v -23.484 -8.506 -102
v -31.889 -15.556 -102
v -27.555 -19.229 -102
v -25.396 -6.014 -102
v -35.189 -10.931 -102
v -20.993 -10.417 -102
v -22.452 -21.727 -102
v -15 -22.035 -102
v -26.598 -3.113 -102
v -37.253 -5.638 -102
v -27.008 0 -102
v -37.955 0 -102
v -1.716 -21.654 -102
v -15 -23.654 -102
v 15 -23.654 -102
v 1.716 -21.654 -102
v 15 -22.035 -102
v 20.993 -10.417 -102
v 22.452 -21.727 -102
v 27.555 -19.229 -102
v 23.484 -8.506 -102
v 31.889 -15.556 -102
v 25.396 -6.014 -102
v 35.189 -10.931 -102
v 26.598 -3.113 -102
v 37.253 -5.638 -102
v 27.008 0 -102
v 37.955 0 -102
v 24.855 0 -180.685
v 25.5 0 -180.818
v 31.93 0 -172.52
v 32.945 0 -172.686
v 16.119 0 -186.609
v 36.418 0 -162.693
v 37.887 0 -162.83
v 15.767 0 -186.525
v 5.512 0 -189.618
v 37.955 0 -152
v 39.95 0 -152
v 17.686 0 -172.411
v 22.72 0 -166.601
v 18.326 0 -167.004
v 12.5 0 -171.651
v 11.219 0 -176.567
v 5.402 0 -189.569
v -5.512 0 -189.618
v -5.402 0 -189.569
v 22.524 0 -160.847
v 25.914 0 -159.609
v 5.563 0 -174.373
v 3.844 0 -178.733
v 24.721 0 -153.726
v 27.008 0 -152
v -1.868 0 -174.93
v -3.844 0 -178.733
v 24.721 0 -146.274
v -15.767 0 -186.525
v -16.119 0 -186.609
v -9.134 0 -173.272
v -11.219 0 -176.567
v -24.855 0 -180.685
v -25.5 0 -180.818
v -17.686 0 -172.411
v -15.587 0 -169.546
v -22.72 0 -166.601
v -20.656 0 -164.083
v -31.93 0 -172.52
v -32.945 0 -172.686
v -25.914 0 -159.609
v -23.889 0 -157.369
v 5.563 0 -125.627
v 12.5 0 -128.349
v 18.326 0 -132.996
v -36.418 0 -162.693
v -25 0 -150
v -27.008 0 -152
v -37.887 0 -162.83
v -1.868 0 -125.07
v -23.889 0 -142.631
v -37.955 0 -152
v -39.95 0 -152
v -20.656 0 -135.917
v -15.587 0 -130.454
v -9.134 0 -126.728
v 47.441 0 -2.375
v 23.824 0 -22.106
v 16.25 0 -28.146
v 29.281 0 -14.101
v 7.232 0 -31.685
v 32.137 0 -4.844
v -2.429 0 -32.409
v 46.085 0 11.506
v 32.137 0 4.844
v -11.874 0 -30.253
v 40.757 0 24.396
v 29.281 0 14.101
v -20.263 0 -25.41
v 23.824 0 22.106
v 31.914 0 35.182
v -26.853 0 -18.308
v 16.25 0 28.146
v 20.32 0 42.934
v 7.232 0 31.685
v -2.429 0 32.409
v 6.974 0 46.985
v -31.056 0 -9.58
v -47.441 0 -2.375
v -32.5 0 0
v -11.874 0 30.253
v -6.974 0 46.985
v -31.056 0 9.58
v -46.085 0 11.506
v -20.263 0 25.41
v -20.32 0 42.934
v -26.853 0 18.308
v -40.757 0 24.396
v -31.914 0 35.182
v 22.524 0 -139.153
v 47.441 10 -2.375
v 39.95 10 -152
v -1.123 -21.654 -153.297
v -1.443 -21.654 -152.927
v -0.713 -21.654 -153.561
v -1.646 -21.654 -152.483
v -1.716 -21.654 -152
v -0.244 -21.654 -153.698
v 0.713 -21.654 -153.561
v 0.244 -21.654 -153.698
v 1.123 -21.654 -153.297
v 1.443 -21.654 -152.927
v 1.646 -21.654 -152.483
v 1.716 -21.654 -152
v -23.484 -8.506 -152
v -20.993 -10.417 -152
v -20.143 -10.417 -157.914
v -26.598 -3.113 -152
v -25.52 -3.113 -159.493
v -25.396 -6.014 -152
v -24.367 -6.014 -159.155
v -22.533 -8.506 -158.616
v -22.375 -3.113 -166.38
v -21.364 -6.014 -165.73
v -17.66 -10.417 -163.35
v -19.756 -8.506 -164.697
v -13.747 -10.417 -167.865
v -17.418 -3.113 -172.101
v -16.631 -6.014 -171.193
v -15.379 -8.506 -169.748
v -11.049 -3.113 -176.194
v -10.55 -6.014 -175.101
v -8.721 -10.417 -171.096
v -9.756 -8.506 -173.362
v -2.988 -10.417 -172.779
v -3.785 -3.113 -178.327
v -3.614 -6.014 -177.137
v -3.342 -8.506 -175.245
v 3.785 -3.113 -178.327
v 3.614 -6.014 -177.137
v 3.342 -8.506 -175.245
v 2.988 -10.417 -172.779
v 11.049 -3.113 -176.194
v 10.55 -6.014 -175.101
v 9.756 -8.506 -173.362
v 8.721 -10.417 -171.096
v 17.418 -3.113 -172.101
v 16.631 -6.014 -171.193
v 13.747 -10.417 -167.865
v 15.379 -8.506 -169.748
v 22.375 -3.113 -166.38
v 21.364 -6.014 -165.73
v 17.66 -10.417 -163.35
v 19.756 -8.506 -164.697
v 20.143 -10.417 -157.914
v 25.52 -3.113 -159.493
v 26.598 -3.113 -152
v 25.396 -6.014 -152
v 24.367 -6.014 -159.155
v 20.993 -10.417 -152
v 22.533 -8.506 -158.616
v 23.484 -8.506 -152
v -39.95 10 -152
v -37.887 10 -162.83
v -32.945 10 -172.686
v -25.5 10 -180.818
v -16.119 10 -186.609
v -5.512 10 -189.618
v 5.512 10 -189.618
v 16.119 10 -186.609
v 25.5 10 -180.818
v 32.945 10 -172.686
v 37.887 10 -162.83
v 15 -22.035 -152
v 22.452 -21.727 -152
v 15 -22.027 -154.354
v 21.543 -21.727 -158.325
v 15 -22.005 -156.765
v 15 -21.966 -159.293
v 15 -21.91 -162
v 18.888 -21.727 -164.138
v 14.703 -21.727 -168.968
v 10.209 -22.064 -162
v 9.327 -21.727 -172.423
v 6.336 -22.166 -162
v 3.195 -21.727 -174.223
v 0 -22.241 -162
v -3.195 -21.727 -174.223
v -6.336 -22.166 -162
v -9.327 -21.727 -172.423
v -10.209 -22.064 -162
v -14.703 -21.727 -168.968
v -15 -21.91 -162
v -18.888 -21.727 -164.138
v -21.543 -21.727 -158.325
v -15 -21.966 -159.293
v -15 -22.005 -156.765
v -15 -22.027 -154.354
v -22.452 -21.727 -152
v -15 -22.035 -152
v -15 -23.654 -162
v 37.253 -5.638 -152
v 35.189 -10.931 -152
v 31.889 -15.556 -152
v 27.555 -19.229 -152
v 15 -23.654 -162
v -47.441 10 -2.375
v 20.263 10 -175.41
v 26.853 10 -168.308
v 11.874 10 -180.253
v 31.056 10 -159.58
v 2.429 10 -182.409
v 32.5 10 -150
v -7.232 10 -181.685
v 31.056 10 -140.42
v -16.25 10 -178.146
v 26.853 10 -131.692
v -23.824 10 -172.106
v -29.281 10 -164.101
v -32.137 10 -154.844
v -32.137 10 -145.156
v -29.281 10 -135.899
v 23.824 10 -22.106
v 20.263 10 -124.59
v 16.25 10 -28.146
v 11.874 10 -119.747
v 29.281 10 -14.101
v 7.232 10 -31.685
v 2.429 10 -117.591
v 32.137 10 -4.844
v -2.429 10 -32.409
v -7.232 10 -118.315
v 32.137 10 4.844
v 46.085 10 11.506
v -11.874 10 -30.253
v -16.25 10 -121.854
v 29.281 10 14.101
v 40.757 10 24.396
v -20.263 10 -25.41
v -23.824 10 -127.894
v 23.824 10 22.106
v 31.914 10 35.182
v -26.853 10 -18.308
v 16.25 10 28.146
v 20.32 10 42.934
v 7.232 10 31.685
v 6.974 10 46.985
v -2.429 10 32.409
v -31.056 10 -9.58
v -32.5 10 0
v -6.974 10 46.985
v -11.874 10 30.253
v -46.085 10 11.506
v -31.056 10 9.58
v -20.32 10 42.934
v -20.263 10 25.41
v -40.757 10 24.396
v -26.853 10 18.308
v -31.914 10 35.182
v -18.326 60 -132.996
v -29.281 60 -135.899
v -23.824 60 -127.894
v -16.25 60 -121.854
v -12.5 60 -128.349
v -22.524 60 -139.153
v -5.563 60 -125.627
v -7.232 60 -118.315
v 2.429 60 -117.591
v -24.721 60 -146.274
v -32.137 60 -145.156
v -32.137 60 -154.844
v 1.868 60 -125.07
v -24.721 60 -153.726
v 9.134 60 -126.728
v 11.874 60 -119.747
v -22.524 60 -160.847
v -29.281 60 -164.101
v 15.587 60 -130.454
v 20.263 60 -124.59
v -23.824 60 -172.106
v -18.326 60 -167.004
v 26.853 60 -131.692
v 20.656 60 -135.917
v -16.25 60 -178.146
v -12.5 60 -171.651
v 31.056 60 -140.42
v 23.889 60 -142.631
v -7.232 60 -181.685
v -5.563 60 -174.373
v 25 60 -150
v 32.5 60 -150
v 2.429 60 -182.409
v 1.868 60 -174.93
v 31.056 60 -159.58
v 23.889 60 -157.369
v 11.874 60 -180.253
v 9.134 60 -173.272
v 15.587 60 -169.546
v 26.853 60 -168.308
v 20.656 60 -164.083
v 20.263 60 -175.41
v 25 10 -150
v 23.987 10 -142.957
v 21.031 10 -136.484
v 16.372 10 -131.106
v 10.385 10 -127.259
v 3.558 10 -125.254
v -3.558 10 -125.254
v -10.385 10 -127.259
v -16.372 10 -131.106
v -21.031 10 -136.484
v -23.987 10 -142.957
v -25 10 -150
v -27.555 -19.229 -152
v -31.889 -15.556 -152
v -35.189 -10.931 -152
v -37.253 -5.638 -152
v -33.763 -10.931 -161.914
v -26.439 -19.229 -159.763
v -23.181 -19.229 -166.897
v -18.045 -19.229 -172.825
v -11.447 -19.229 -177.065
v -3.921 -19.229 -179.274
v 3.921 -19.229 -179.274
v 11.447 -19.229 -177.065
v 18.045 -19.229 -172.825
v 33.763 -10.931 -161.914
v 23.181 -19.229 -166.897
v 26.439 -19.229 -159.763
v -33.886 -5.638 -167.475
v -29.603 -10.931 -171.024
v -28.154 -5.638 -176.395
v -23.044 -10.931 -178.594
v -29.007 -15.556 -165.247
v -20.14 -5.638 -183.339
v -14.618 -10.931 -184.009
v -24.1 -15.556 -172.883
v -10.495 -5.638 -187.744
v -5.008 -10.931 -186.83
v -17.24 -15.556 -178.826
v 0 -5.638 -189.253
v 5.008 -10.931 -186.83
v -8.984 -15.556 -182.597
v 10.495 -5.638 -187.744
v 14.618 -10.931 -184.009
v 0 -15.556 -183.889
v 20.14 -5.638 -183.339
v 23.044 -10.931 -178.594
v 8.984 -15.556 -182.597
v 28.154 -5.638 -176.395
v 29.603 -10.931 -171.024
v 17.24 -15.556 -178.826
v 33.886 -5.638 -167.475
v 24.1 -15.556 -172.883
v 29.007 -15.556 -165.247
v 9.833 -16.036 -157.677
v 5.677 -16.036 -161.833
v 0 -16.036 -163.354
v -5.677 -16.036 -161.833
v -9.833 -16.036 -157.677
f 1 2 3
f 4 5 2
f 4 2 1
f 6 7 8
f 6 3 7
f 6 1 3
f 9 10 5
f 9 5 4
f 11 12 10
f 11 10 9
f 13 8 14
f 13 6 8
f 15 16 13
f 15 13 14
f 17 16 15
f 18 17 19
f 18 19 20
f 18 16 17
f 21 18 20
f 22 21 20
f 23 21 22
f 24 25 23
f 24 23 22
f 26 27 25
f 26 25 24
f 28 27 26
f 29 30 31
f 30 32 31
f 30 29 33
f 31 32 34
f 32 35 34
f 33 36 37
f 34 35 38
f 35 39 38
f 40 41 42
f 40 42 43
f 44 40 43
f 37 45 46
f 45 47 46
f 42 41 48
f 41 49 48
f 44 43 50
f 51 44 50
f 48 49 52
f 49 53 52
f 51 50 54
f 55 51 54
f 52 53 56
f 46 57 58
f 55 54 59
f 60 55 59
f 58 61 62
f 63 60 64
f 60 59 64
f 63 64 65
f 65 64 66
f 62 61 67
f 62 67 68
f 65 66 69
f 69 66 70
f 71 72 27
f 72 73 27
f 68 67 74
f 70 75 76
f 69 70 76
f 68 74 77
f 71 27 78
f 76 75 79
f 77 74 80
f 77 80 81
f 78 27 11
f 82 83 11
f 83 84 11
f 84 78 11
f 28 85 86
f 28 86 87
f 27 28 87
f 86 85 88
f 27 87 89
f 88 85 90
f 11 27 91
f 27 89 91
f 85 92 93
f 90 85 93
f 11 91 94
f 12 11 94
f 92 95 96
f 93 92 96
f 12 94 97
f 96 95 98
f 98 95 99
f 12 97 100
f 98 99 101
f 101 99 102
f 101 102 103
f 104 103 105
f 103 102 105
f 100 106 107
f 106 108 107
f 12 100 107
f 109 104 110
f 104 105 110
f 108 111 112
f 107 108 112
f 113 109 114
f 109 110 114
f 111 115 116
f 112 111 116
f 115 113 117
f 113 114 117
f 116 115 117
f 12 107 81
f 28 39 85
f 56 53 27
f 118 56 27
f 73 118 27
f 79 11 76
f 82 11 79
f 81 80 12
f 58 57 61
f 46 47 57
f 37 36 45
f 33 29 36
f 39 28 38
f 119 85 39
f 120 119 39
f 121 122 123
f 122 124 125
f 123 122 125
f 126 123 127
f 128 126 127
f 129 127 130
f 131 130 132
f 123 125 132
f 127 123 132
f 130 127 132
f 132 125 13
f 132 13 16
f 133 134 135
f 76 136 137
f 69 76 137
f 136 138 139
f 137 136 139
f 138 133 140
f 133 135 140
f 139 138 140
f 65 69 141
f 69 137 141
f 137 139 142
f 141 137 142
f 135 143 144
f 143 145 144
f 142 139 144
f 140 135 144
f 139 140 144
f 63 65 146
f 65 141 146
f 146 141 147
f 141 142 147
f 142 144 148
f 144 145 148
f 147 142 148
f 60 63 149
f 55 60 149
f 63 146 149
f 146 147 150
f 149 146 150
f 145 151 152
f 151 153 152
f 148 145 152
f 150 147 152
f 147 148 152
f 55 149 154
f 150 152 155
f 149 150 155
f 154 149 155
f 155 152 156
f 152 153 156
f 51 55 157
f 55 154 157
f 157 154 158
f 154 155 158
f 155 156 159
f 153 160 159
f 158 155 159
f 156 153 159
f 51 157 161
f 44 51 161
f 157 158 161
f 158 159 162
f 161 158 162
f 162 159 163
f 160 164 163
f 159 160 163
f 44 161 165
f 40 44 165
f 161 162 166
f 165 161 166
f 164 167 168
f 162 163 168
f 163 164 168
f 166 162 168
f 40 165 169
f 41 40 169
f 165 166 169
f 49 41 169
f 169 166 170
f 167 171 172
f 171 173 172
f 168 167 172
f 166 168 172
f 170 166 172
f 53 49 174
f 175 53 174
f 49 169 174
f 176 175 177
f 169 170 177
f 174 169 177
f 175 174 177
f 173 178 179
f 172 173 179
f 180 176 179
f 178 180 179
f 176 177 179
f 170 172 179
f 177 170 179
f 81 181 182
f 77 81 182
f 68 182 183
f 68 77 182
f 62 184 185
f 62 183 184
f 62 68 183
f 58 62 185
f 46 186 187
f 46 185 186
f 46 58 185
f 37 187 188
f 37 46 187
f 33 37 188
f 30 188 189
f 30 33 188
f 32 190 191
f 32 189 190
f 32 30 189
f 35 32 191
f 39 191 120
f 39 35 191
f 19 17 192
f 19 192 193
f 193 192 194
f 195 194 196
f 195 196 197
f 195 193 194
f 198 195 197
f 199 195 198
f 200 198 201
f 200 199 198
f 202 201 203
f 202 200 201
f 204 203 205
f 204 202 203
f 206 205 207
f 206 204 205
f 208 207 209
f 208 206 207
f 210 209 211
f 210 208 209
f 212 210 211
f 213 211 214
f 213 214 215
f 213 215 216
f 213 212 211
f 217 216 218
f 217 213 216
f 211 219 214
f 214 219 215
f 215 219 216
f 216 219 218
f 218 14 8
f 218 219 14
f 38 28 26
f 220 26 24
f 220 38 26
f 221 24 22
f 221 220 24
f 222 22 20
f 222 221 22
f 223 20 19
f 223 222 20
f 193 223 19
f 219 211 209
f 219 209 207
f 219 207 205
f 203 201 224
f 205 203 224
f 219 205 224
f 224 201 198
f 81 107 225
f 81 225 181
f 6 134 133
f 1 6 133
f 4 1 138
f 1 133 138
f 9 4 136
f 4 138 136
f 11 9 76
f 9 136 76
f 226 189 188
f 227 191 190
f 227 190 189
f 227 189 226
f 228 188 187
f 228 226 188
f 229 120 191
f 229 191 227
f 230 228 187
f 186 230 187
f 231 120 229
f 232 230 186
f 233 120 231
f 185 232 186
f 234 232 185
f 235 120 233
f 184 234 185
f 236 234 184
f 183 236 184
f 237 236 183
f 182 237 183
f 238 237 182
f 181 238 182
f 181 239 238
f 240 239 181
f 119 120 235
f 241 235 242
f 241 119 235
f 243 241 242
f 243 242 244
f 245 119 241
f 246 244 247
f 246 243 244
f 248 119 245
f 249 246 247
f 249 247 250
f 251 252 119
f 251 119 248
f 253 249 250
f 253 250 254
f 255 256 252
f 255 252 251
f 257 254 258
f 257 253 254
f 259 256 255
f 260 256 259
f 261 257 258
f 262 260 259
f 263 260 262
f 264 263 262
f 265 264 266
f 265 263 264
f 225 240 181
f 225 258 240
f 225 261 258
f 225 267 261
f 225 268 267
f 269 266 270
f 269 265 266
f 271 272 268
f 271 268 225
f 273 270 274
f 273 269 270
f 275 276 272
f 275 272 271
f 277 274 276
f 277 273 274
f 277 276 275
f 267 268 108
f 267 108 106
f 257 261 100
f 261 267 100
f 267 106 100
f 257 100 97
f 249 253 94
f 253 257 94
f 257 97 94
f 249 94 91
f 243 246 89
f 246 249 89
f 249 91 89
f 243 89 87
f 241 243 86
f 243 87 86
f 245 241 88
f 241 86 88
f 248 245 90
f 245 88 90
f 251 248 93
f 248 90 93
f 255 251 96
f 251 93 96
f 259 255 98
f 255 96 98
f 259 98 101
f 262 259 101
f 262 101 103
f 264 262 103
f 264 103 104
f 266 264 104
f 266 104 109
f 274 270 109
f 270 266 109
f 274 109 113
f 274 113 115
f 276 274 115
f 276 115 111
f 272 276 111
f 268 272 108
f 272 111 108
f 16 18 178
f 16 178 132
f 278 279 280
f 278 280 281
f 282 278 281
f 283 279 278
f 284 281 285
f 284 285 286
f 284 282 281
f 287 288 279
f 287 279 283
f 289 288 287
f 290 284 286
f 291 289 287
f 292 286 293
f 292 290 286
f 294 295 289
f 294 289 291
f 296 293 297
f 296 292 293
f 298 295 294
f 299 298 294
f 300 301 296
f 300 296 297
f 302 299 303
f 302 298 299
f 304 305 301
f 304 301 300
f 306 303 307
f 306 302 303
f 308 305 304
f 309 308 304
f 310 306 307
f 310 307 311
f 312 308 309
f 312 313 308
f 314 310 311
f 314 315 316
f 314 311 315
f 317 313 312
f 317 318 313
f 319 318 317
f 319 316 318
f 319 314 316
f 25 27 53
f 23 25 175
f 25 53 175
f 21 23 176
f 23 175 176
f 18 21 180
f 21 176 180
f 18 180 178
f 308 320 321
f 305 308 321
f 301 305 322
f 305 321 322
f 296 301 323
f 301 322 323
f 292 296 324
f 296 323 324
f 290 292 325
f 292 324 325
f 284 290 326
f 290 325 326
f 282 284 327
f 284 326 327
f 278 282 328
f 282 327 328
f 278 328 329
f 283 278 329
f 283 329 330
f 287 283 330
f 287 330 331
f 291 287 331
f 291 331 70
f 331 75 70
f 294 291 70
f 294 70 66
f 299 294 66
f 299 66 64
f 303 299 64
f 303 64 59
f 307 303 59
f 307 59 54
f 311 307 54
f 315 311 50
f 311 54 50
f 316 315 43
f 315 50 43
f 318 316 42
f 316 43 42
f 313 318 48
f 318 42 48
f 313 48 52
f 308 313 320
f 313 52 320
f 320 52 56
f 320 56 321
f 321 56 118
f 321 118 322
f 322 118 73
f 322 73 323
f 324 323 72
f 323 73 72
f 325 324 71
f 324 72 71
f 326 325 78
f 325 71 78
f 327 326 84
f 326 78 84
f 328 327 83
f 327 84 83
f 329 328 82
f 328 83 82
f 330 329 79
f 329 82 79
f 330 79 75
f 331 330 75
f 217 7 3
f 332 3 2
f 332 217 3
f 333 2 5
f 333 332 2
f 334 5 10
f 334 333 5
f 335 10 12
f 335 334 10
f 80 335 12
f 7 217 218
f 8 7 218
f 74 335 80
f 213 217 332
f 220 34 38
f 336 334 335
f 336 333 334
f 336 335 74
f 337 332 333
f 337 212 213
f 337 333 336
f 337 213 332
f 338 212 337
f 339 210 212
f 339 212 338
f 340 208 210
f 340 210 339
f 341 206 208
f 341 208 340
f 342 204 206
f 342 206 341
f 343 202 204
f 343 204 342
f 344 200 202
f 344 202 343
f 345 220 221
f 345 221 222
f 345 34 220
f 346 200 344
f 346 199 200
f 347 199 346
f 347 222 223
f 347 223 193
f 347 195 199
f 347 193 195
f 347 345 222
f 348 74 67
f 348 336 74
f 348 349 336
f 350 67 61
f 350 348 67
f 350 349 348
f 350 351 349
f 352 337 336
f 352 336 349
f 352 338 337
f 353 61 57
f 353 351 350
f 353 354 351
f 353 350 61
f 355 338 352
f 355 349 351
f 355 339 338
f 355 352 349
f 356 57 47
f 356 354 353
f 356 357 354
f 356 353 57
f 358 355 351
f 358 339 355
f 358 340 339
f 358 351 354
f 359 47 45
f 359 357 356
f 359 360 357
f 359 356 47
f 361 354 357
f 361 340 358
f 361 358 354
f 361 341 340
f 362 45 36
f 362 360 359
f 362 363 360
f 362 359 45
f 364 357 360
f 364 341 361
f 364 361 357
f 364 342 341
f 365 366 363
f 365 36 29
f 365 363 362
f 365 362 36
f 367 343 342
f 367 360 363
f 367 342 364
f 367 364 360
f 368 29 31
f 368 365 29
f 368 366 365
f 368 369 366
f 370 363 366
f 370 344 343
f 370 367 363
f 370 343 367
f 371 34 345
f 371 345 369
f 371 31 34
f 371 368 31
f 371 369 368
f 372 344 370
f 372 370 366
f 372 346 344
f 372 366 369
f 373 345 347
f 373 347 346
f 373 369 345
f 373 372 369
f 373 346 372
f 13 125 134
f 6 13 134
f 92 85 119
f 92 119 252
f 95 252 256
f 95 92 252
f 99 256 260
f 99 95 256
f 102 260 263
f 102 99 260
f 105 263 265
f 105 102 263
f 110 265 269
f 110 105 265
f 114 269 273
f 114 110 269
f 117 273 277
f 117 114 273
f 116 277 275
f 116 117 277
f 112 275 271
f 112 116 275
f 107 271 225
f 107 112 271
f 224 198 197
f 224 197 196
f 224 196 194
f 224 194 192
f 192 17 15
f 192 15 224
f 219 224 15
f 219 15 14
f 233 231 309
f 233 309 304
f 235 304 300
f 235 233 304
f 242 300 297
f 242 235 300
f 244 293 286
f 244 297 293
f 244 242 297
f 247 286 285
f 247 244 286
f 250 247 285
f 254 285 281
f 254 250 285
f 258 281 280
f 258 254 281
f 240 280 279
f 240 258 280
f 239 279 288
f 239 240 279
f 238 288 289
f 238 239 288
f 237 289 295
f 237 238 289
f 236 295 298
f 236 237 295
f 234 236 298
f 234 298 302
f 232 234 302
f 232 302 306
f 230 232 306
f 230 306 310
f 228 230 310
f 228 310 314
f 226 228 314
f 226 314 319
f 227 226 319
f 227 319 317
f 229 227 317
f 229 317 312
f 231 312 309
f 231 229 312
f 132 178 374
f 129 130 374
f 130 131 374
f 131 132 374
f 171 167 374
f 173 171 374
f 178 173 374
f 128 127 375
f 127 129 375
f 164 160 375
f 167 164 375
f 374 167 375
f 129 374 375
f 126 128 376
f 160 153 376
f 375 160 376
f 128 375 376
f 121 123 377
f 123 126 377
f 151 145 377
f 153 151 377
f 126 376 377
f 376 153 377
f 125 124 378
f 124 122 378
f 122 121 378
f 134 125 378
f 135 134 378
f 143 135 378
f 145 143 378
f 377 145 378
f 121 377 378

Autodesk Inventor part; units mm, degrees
ref_plane "YZ Plane" through (0, 0, 0) normal (1, 0, 0) x (0, 1, 0)
ref_plane "XZ Plane" through (0, 0, 0) normal (0, 1, 0) x (-1, 0, 0)
sketch "Skizze1" plane through (0, 0, 0) normal (0, 1, 0) x (-1, 0, 0)
  circle A0 centre (0, 0) radius 32.5
  circle A1 centre (0, 0) radius 47.5
  line L0 (0, 0) -> (0, -150) construction
  circle A2 centre (0, -150) radius 25
  circle A3 centre (0, -150) radius 40
  line L1 (47.4406, -2.375) -> (39.95, -152)
  line L2 (-47.4406, -2.375) -> (-39.95, -152)
  dimension "d0" = 65
  dimension "d1" = 15
  dimension "d2" = 150
  dimension "d3" = 50
  dimension "d4" = 15
extrude "Extrusion1" add sketch "Skizze1" along normal blind 10
sketch "Skizze2" plane through (0, 10, 0) normal (0, 1, 0) x (1, 0, 0)
  circle A0 centre (0, 150) radius 25 projected
  circle A1 centre (0, 150) radius 32.5
  point P0 (0, 0)
  dimension "d7" = 7.5
extrude "Extrusion2" add sketch "Skizze2" along normal blind 50
ref_plane "Arbeitsebene1" through (0, 0, -190) normal (-1, 0, 0) x (0, -1, 0)
sketch "Skizze3" plane through (0, 0, -190) normal (-1, 0, 0) x (0, -1, 0)
  line L0 (0, 38) -> (0, 0) projected
  line L1 (0, 10.9925) -> (10.9925, 10.9925) construction
  line L2 (0, 10.9925) -> (0, 0) construction
  line L3 (0, 0) -> (0, 3)
  line L4 (0, 38) -> (-10, 38) construction
  line L5 (0, 38) -> (16.612, 38) construction
  arc A0 (0, 10.9925) -> (10.4174, 17.007) centre (0, 23.0214) ccw
  line L6 (0, 23.0214) -> (12.0289, 23.0214) construction
  line L7 (0, 23.0214) -> (0, 10.9925) construction
  line L8 (-10.9478, 2.8205) -> (-10.9478, 33.9693) construction
  line L9 (-10.9478, 33.9693) -> (20.2009, 33.9693) construction
  line L10 (22.6543, 38) -> (21.7274, 15.548)
  arc A1 (0, 0.0447) -> (21.7274, 15.548) centre (0, 23.0214) ccw
  line L11 (0, 10.9925) -> (0, 3)
  line L12 (10.4174, 17.007) -> (22.6543, 38)
  point P0 (0, 190)
  dimension "d12" = 90
revolve "Umdrehung1" add sketch "Skizze3" angle 180 mid plane about axis through (0, 0, -152) along (0, -1, 0)
sketch "Skizze4" plane through (-37.9553, 0, -152) normal (0, 0, 1) x (1, 0, 0)
  line L0 (64.9628, 0) -> (75.9106, 0) projected
  arc A0 (58.9484, -10.4174) -> (64.9628, 0) centre (52.9339, 0) ccw projected
  line L1 (58.9484, -10.4174) -> (37.9553, -22.6543) projected
  line L2 (37.9553, -22.6543) -> (60.4073, -21.7274) projected
  arc A1 (60.4073, -21.7274) -> (75.9106, 0) centre (52.9339, 0) ccw projected
  line L3 (0, 0) -> (10.9478, 0) projected
  arc A2 (0, 0) -> (15.5034, -21.7274) centre (22.9768, 0) ccw projected
  line L4 (15.5034, -21.7274) -> (37.9553, -22.6543) projected
  line L5 (37.9553, -22.6543) -> (16.9623, -10.4174) projected
  arc A3 (10.9478, 0) -> (16.9623, -10.4174) centre (22.9768, 0) ccw projected
  point P0 (37.9553, 0)
extrude "Extrusion3" add sketch "Skizze4" along normal blind 50
sketch "Skizze5" plane through (-37.9553, 0, -102) normal (0, 0, 1) x (1, 0, 0)
  line L0 (22.9553, -21.6543) -> (52.9553, -21.6543)
  line L1 (52.9553, -21.6543) -> (52.9553, -23.6543)
  line L2 (52.9553, -23.6543) -> (22.9553, -23.6543)
  line L3 (22.9553, -23.6543) -> (22.9553, -21.6543)
  line L4 (37.9553, -22.6543) -> (16.9623, -10.4174) projected
  line L5 (22.9553, -21.6543) -> (52.9553, -23.6543) construction
  line L6 (52.9553, -21.6543) -> (22.9553, -23.6543) construction
  point P0 (37.9553, 0)
  dimension "d16" = 30
  dimension "d17" = 2
extrude "Extrusion4" add sketch "Skizze5" against normal blind 60
properties part number "Absaugschuh" material "PET-Kunststoff"
